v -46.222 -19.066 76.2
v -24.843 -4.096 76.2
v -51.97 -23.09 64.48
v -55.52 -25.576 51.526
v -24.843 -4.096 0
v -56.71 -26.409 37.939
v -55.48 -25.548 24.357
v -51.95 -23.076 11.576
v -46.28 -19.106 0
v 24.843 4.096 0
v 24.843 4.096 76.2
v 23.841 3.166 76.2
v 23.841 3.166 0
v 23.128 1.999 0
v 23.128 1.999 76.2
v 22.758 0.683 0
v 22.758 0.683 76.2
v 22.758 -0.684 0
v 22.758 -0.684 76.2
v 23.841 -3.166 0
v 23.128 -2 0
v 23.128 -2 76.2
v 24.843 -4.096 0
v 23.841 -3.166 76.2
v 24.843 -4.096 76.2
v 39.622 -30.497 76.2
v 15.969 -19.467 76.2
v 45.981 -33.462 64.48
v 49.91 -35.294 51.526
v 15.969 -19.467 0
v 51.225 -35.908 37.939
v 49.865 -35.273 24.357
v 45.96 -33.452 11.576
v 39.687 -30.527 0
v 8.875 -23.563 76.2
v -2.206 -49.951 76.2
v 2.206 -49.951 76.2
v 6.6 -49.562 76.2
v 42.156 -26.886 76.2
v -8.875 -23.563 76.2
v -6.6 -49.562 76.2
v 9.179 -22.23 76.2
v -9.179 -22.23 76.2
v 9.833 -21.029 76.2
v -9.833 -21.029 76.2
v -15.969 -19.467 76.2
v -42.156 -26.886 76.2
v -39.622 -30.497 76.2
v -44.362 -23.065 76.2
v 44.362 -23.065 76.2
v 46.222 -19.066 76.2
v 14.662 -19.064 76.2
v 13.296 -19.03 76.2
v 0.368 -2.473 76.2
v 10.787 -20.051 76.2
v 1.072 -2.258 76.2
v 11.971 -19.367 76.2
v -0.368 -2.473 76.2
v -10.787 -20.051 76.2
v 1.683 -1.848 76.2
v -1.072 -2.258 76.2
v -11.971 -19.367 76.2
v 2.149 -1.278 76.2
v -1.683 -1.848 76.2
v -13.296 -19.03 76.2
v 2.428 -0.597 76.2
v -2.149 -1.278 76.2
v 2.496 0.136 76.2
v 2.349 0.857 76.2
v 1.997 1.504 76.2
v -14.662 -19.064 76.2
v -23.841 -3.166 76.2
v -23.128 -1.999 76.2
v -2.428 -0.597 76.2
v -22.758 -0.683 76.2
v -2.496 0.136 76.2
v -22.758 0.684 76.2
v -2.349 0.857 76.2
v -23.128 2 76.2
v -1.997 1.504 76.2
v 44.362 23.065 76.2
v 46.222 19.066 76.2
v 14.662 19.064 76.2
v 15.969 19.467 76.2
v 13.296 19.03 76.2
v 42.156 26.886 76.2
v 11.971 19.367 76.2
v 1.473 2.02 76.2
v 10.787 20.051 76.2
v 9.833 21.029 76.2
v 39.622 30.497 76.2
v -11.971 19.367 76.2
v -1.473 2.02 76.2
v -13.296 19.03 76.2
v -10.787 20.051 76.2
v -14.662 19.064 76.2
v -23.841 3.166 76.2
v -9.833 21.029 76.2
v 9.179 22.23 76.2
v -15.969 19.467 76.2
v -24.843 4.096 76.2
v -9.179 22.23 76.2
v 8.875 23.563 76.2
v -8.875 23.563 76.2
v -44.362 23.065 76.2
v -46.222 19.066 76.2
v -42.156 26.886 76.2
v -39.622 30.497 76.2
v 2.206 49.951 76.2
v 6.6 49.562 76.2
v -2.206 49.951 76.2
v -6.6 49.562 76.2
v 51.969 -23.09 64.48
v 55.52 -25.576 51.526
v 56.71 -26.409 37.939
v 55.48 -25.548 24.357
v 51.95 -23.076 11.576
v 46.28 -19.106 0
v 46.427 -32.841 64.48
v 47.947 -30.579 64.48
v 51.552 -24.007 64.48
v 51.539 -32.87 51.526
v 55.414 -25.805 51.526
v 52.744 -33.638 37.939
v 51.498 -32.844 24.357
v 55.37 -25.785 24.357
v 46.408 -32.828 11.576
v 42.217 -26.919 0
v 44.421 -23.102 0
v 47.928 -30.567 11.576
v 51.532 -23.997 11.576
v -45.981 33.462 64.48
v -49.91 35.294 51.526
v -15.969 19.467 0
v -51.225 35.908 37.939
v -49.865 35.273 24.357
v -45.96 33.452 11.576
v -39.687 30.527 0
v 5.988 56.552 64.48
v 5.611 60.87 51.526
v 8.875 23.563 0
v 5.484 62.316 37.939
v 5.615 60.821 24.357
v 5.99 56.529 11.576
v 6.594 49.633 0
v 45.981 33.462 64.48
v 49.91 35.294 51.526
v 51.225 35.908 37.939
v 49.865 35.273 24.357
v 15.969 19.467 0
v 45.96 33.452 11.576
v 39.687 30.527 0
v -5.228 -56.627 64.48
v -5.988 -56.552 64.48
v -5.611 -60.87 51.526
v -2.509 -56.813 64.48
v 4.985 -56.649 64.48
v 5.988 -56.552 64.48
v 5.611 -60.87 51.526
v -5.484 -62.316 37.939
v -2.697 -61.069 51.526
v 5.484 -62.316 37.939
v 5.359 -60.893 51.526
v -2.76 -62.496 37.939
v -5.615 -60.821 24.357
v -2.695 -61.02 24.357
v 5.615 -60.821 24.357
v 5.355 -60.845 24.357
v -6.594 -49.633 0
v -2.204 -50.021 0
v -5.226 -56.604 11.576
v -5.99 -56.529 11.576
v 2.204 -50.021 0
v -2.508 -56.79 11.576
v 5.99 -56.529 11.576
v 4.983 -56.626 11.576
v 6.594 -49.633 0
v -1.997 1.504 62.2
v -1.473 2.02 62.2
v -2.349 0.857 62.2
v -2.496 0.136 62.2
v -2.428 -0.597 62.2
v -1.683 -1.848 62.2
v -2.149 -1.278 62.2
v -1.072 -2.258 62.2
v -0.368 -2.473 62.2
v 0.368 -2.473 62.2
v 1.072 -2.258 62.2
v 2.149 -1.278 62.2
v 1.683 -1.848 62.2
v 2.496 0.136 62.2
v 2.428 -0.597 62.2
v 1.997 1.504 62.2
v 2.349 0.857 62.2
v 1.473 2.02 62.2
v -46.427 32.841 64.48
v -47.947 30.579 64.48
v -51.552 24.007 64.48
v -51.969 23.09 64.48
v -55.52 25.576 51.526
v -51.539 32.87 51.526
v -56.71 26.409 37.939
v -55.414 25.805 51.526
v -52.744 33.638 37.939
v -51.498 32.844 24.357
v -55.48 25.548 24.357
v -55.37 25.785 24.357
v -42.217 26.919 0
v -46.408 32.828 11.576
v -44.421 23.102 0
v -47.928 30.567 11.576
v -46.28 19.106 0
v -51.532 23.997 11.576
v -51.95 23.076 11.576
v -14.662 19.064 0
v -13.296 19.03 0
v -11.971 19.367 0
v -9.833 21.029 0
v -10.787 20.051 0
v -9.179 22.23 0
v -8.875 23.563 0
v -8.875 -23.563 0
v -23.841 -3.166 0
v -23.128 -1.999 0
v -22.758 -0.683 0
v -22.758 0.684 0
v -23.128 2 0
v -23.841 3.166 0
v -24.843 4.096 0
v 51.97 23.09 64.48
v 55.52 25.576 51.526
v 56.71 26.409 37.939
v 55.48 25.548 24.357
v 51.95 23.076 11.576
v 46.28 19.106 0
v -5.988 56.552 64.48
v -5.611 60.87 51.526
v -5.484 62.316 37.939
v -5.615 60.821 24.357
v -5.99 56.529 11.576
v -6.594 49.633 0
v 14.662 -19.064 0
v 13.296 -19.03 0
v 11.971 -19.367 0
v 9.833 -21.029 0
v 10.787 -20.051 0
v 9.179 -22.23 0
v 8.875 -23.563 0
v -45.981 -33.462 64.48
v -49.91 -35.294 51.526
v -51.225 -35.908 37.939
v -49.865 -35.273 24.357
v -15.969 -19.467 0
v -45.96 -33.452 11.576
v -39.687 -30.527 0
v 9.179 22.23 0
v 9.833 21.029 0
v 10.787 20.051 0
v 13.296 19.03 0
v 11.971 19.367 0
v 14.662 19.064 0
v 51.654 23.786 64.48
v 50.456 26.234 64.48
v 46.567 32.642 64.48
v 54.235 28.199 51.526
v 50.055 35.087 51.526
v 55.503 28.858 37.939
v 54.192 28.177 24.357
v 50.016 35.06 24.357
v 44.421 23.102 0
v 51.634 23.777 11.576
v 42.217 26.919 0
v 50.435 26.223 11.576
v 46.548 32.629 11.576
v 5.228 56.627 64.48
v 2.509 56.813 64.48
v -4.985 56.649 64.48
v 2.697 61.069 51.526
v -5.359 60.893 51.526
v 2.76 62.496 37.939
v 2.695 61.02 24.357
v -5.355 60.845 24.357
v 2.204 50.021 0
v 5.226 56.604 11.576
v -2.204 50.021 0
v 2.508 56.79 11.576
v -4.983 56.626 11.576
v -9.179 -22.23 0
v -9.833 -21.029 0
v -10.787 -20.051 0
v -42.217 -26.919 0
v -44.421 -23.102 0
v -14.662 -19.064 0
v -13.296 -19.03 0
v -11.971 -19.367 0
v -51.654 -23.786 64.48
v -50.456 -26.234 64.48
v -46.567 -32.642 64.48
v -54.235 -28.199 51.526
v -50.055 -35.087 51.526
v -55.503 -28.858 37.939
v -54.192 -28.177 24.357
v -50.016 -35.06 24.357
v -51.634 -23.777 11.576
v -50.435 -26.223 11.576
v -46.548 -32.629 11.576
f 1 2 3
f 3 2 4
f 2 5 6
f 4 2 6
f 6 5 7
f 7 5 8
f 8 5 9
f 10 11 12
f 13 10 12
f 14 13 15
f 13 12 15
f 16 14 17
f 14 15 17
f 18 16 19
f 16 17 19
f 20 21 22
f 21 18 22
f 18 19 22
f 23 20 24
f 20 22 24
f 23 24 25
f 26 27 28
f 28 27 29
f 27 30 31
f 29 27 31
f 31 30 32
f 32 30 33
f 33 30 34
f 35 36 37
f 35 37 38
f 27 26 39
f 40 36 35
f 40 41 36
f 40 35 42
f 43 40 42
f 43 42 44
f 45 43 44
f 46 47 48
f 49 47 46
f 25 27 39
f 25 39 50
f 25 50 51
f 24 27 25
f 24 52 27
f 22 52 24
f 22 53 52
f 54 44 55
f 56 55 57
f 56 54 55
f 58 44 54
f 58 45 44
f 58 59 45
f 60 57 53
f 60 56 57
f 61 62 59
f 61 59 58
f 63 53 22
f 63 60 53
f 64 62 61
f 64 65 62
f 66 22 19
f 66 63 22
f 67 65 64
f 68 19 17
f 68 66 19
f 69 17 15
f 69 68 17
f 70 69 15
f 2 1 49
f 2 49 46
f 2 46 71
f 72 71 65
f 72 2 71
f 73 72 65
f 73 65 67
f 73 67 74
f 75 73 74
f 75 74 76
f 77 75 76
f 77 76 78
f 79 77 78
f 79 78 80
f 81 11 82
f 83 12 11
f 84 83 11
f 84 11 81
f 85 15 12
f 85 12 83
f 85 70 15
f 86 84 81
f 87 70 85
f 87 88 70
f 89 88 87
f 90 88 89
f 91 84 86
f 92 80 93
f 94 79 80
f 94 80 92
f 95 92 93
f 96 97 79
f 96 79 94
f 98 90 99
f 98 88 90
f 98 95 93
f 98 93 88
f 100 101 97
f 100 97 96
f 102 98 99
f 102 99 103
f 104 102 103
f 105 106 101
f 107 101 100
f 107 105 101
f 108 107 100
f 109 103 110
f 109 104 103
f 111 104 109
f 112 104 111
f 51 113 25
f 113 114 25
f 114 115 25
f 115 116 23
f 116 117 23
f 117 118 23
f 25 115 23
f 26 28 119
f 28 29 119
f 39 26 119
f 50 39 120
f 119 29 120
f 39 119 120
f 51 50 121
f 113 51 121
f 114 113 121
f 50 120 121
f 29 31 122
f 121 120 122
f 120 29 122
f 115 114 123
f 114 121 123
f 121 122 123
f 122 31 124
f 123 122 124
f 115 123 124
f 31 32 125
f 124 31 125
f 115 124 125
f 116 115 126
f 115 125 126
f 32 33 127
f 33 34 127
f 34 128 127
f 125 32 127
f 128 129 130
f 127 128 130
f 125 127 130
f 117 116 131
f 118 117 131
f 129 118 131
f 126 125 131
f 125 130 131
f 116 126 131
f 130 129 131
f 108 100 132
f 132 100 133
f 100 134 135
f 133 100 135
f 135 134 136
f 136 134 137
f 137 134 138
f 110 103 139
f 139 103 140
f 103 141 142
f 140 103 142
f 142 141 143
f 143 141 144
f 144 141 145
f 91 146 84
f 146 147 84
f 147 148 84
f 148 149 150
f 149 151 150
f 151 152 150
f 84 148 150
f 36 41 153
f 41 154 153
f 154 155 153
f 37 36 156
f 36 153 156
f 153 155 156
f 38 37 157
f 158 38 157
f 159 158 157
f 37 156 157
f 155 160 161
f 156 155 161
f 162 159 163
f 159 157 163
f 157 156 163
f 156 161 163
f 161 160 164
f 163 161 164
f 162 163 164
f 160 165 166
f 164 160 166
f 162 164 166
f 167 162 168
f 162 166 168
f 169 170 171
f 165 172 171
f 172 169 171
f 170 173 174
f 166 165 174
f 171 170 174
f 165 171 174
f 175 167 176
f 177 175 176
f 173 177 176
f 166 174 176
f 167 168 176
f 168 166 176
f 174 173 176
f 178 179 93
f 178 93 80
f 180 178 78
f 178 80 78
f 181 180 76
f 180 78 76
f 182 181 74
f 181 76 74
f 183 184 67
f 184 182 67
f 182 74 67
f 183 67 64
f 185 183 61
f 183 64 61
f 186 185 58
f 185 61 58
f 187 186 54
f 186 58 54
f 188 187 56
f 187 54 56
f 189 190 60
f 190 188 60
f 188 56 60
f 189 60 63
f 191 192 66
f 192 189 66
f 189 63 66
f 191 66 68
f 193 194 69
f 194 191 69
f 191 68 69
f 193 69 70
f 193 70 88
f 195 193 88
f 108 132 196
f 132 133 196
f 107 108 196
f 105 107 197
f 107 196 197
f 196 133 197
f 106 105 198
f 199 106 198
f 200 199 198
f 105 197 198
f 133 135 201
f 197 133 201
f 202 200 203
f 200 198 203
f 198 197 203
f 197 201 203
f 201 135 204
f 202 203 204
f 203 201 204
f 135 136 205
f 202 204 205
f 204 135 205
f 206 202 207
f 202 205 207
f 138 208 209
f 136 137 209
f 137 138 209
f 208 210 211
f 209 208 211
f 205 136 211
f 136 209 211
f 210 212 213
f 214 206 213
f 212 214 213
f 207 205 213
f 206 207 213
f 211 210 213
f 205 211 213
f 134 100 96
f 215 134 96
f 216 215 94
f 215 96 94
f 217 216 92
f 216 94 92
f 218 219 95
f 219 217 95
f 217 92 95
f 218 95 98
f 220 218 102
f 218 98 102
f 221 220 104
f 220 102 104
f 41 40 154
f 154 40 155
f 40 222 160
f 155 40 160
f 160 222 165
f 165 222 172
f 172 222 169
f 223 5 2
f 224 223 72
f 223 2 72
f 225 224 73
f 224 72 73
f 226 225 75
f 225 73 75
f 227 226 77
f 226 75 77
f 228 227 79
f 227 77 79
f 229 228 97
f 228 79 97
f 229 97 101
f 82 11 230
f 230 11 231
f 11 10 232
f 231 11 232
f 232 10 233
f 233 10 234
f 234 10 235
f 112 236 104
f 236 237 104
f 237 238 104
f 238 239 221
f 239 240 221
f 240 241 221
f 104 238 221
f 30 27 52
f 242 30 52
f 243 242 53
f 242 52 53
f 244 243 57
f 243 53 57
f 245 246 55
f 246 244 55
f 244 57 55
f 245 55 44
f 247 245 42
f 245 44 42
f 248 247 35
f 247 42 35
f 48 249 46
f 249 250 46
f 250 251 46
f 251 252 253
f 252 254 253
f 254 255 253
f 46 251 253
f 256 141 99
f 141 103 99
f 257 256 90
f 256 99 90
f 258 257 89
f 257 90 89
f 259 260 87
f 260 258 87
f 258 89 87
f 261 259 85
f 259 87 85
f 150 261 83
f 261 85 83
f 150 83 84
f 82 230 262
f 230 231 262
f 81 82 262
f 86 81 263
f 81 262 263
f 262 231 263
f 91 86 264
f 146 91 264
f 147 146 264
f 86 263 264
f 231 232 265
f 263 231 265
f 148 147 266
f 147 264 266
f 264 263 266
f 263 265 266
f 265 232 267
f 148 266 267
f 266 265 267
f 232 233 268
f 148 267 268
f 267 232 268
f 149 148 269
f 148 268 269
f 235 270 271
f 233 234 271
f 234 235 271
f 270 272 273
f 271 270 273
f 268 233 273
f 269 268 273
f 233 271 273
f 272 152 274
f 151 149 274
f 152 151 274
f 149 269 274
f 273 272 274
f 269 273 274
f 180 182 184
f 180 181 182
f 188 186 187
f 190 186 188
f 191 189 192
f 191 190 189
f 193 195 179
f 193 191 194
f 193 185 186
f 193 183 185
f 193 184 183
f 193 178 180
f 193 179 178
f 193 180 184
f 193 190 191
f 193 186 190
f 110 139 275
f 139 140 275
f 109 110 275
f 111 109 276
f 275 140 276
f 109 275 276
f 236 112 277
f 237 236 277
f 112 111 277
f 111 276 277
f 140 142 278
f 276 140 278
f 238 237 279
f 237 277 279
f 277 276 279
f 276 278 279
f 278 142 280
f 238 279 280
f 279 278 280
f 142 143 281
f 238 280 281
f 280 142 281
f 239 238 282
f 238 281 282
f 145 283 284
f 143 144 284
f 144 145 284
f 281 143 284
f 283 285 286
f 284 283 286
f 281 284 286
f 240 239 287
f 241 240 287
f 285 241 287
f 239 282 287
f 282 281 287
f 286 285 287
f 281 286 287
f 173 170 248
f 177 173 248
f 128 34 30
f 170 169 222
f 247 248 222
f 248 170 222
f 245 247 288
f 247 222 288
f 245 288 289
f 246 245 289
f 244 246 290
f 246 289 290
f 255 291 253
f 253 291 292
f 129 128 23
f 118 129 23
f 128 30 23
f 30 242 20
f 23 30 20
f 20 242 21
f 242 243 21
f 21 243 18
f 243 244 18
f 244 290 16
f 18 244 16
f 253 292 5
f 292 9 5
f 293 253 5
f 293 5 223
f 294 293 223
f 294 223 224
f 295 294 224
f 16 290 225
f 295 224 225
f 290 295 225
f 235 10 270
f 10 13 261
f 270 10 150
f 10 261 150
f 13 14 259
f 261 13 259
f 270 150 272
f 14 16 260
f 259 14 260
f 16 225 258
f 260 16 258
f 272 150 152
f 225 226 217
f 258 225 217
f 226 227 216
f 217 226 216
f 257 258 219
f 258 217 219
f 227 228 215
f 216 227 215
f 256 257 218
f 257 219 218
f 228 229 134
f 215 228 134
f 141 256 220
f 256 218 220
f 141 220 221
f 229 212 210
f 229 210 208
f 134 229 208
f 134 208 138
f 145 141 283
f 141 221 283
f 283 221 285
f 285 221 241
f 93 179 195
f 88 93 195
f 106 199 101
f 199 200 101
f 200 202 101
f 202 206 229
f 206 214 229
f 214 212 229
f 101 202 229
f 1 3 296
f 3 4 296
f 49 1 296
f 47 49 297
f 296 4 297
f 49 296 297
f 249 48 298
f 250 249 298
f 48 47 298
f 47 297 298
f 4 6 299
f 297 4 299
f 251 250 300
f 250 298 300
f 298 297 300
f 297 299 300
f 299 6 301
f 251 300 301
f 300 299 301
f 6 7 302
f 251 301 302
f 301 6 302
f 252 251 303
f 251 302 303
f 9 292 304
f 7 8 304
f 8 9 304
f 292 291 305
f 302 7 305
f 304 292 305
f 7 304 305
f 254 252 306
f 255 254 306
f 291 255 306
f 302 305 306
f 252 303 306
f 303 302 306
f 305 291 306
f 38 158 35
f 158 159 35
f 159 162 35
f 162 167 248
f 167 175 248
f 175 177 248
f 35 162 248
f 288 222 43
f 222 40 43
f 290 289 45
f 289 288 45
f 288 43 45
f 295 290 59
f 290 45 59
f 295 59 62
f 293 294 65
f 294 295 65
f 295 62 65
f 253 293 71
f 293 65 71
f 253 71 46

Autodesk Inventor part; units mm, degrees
ref_plane "YZ Plane" through (0, 0, 0) normal (1, 0, 0) x (0, 1, 0)
ref_plane "XZ Plane" through (0, 0, 0) normal (0, 1, 0) x (-1, 0, 0)
ref_plane "XY Plane" through (0, 0, 0) normal (0, 0, 1) x (1, 0, 0)
sketch "Sketch6" plane through (0, 0, 0) normal (0, 0, 1) x (1, 0, 0)
  circle A0 centre (0, 0) radius 2.75
  line L0 (0, 0) -> (0, 125)
  line L1 (0, 0) -> (108.2532, 62.5)
  line L2 (0, 0) -> (125, 0) construction
  line L3 (0, 0) -> (18.8687, 32.6815)
  line L4 (0, 0) -> (37.7374, 0) construction
  line L5 (108.2532, 62.5) -> (9.497, 16.4492)
  line L6 (108.2532, 62.5) -> (217.2186, 62.5) construction
  line L7 (9.497, 16.4492) -> (0, 125)
  line L8 (0, 125) -> (-9.497, 16.4492)
  line L9 (-9.497, 16.4492) -> (-108.2532, 62.5)
  line L10 (-108.2532, 62.5) -> (-18.9939, 0)
  line L11 (-18.9939, 0) -> (-108.2532, -62.5)
  line L12 (-108.2532, -62.5) -> (-9.497, -16.4492)
  line L13 (-9.497, -16.4492) -> (0, -125)
  line L14 (0, -125) -> (9.497, -16.4492)
  line L15 (9.497, -16.4492) -> (108.2532, -62.5)
  line L16 (108.2532, -62.5) -> (18.9939, 0)
  line L17 (18.9939, 0) -> (108.2532, 62.5)
  dimension "d21" = 5.5
  dimension "d22" = 125
  dimension "d23" = 30
  dimension "d24" = 60
  dimension "d25" = 155
  dimension "d28" = 360
extrude "Extrusion2" add sketch "Sketch6" along normal blind 76.2 contours L1 L3 A0 | A0 L3 L5 L1 | L0 L7 L3 A0 | A0 L3 L0
sketch "Sketch4" plane through (0, 0, 0) normal (0, 1, 0) x (-1, 0, 0)
  line L0 (-125.0691, 0) -> (-125.0691, 76.2)
  line L1 (0, -15.24) -> (0, 91.44) projected
  line L2 (-50.0691, 0) -> (-0.0691, 0)
  line L3 (-50, 76.2) -> (0, 76.2)
  line L4 (0, 76.2) -> (-125.0691, 76.2)
  line L5 (0, 0) -> (-108.2532, 0) projected
  line L6 (-125.0691, 0) -> (0, 0)
  arc A0 (-50, 76.2) -> (-50.0691, 0) centre (1.6634, 38.0531) ccw
  point P0 (-25, 76.2)
  point P1 (-0.0691, 76.2)
  point P2 (-62.5691, 76.2)
  dimension "d7" = 125
  dimension "d36" = 50
  dimension "d37" = 50
pattern_circular "Circular Pattern1" count 6 over 360 about axis through (0, 0, -10) along (0, 0, 1) of "Extrusion2"
revolve "Revolution2" cut sketch "Sketch4" angle 360 about axis through (0, 0, -10) along (0, 0, 1) contours L0 L4 A0 L5 L6
fillet "Fillet1" radius 5 1 edges at (-18.9939, 0, 38.1)
pattern_circular "Circular Pattern2" count 6 over 360 about axis through (0, 0, -10) along (0, 0, 1) of "Fillet1"
sketch "Sketch9" plane through (0, 0, 76.2) normal (0, 0, 1) x (1, 0, 0)
  circle A0 centre (0, 0) radius 2.5
  line L0 (0, 2.5) -> (0, 2.02)
  line L1 (0, 2.02) -> (-1.473, 2.02)
  line L2 (0, 2.02) -> (1.473, 2.02)
  dimension "d42" = 5
  dimension "d43" = 0.48
extrude "Extrusion3" cut sketch "Sketch9" against normal blind 14 contours A0 L1 L2
sketch "Sketch10" plane through (0, 0, 76.2) normal (0, 0, 1) x (1, 0, 0)
  point P0 (0, 0)
properties part number "Dispensing Gear V2"
